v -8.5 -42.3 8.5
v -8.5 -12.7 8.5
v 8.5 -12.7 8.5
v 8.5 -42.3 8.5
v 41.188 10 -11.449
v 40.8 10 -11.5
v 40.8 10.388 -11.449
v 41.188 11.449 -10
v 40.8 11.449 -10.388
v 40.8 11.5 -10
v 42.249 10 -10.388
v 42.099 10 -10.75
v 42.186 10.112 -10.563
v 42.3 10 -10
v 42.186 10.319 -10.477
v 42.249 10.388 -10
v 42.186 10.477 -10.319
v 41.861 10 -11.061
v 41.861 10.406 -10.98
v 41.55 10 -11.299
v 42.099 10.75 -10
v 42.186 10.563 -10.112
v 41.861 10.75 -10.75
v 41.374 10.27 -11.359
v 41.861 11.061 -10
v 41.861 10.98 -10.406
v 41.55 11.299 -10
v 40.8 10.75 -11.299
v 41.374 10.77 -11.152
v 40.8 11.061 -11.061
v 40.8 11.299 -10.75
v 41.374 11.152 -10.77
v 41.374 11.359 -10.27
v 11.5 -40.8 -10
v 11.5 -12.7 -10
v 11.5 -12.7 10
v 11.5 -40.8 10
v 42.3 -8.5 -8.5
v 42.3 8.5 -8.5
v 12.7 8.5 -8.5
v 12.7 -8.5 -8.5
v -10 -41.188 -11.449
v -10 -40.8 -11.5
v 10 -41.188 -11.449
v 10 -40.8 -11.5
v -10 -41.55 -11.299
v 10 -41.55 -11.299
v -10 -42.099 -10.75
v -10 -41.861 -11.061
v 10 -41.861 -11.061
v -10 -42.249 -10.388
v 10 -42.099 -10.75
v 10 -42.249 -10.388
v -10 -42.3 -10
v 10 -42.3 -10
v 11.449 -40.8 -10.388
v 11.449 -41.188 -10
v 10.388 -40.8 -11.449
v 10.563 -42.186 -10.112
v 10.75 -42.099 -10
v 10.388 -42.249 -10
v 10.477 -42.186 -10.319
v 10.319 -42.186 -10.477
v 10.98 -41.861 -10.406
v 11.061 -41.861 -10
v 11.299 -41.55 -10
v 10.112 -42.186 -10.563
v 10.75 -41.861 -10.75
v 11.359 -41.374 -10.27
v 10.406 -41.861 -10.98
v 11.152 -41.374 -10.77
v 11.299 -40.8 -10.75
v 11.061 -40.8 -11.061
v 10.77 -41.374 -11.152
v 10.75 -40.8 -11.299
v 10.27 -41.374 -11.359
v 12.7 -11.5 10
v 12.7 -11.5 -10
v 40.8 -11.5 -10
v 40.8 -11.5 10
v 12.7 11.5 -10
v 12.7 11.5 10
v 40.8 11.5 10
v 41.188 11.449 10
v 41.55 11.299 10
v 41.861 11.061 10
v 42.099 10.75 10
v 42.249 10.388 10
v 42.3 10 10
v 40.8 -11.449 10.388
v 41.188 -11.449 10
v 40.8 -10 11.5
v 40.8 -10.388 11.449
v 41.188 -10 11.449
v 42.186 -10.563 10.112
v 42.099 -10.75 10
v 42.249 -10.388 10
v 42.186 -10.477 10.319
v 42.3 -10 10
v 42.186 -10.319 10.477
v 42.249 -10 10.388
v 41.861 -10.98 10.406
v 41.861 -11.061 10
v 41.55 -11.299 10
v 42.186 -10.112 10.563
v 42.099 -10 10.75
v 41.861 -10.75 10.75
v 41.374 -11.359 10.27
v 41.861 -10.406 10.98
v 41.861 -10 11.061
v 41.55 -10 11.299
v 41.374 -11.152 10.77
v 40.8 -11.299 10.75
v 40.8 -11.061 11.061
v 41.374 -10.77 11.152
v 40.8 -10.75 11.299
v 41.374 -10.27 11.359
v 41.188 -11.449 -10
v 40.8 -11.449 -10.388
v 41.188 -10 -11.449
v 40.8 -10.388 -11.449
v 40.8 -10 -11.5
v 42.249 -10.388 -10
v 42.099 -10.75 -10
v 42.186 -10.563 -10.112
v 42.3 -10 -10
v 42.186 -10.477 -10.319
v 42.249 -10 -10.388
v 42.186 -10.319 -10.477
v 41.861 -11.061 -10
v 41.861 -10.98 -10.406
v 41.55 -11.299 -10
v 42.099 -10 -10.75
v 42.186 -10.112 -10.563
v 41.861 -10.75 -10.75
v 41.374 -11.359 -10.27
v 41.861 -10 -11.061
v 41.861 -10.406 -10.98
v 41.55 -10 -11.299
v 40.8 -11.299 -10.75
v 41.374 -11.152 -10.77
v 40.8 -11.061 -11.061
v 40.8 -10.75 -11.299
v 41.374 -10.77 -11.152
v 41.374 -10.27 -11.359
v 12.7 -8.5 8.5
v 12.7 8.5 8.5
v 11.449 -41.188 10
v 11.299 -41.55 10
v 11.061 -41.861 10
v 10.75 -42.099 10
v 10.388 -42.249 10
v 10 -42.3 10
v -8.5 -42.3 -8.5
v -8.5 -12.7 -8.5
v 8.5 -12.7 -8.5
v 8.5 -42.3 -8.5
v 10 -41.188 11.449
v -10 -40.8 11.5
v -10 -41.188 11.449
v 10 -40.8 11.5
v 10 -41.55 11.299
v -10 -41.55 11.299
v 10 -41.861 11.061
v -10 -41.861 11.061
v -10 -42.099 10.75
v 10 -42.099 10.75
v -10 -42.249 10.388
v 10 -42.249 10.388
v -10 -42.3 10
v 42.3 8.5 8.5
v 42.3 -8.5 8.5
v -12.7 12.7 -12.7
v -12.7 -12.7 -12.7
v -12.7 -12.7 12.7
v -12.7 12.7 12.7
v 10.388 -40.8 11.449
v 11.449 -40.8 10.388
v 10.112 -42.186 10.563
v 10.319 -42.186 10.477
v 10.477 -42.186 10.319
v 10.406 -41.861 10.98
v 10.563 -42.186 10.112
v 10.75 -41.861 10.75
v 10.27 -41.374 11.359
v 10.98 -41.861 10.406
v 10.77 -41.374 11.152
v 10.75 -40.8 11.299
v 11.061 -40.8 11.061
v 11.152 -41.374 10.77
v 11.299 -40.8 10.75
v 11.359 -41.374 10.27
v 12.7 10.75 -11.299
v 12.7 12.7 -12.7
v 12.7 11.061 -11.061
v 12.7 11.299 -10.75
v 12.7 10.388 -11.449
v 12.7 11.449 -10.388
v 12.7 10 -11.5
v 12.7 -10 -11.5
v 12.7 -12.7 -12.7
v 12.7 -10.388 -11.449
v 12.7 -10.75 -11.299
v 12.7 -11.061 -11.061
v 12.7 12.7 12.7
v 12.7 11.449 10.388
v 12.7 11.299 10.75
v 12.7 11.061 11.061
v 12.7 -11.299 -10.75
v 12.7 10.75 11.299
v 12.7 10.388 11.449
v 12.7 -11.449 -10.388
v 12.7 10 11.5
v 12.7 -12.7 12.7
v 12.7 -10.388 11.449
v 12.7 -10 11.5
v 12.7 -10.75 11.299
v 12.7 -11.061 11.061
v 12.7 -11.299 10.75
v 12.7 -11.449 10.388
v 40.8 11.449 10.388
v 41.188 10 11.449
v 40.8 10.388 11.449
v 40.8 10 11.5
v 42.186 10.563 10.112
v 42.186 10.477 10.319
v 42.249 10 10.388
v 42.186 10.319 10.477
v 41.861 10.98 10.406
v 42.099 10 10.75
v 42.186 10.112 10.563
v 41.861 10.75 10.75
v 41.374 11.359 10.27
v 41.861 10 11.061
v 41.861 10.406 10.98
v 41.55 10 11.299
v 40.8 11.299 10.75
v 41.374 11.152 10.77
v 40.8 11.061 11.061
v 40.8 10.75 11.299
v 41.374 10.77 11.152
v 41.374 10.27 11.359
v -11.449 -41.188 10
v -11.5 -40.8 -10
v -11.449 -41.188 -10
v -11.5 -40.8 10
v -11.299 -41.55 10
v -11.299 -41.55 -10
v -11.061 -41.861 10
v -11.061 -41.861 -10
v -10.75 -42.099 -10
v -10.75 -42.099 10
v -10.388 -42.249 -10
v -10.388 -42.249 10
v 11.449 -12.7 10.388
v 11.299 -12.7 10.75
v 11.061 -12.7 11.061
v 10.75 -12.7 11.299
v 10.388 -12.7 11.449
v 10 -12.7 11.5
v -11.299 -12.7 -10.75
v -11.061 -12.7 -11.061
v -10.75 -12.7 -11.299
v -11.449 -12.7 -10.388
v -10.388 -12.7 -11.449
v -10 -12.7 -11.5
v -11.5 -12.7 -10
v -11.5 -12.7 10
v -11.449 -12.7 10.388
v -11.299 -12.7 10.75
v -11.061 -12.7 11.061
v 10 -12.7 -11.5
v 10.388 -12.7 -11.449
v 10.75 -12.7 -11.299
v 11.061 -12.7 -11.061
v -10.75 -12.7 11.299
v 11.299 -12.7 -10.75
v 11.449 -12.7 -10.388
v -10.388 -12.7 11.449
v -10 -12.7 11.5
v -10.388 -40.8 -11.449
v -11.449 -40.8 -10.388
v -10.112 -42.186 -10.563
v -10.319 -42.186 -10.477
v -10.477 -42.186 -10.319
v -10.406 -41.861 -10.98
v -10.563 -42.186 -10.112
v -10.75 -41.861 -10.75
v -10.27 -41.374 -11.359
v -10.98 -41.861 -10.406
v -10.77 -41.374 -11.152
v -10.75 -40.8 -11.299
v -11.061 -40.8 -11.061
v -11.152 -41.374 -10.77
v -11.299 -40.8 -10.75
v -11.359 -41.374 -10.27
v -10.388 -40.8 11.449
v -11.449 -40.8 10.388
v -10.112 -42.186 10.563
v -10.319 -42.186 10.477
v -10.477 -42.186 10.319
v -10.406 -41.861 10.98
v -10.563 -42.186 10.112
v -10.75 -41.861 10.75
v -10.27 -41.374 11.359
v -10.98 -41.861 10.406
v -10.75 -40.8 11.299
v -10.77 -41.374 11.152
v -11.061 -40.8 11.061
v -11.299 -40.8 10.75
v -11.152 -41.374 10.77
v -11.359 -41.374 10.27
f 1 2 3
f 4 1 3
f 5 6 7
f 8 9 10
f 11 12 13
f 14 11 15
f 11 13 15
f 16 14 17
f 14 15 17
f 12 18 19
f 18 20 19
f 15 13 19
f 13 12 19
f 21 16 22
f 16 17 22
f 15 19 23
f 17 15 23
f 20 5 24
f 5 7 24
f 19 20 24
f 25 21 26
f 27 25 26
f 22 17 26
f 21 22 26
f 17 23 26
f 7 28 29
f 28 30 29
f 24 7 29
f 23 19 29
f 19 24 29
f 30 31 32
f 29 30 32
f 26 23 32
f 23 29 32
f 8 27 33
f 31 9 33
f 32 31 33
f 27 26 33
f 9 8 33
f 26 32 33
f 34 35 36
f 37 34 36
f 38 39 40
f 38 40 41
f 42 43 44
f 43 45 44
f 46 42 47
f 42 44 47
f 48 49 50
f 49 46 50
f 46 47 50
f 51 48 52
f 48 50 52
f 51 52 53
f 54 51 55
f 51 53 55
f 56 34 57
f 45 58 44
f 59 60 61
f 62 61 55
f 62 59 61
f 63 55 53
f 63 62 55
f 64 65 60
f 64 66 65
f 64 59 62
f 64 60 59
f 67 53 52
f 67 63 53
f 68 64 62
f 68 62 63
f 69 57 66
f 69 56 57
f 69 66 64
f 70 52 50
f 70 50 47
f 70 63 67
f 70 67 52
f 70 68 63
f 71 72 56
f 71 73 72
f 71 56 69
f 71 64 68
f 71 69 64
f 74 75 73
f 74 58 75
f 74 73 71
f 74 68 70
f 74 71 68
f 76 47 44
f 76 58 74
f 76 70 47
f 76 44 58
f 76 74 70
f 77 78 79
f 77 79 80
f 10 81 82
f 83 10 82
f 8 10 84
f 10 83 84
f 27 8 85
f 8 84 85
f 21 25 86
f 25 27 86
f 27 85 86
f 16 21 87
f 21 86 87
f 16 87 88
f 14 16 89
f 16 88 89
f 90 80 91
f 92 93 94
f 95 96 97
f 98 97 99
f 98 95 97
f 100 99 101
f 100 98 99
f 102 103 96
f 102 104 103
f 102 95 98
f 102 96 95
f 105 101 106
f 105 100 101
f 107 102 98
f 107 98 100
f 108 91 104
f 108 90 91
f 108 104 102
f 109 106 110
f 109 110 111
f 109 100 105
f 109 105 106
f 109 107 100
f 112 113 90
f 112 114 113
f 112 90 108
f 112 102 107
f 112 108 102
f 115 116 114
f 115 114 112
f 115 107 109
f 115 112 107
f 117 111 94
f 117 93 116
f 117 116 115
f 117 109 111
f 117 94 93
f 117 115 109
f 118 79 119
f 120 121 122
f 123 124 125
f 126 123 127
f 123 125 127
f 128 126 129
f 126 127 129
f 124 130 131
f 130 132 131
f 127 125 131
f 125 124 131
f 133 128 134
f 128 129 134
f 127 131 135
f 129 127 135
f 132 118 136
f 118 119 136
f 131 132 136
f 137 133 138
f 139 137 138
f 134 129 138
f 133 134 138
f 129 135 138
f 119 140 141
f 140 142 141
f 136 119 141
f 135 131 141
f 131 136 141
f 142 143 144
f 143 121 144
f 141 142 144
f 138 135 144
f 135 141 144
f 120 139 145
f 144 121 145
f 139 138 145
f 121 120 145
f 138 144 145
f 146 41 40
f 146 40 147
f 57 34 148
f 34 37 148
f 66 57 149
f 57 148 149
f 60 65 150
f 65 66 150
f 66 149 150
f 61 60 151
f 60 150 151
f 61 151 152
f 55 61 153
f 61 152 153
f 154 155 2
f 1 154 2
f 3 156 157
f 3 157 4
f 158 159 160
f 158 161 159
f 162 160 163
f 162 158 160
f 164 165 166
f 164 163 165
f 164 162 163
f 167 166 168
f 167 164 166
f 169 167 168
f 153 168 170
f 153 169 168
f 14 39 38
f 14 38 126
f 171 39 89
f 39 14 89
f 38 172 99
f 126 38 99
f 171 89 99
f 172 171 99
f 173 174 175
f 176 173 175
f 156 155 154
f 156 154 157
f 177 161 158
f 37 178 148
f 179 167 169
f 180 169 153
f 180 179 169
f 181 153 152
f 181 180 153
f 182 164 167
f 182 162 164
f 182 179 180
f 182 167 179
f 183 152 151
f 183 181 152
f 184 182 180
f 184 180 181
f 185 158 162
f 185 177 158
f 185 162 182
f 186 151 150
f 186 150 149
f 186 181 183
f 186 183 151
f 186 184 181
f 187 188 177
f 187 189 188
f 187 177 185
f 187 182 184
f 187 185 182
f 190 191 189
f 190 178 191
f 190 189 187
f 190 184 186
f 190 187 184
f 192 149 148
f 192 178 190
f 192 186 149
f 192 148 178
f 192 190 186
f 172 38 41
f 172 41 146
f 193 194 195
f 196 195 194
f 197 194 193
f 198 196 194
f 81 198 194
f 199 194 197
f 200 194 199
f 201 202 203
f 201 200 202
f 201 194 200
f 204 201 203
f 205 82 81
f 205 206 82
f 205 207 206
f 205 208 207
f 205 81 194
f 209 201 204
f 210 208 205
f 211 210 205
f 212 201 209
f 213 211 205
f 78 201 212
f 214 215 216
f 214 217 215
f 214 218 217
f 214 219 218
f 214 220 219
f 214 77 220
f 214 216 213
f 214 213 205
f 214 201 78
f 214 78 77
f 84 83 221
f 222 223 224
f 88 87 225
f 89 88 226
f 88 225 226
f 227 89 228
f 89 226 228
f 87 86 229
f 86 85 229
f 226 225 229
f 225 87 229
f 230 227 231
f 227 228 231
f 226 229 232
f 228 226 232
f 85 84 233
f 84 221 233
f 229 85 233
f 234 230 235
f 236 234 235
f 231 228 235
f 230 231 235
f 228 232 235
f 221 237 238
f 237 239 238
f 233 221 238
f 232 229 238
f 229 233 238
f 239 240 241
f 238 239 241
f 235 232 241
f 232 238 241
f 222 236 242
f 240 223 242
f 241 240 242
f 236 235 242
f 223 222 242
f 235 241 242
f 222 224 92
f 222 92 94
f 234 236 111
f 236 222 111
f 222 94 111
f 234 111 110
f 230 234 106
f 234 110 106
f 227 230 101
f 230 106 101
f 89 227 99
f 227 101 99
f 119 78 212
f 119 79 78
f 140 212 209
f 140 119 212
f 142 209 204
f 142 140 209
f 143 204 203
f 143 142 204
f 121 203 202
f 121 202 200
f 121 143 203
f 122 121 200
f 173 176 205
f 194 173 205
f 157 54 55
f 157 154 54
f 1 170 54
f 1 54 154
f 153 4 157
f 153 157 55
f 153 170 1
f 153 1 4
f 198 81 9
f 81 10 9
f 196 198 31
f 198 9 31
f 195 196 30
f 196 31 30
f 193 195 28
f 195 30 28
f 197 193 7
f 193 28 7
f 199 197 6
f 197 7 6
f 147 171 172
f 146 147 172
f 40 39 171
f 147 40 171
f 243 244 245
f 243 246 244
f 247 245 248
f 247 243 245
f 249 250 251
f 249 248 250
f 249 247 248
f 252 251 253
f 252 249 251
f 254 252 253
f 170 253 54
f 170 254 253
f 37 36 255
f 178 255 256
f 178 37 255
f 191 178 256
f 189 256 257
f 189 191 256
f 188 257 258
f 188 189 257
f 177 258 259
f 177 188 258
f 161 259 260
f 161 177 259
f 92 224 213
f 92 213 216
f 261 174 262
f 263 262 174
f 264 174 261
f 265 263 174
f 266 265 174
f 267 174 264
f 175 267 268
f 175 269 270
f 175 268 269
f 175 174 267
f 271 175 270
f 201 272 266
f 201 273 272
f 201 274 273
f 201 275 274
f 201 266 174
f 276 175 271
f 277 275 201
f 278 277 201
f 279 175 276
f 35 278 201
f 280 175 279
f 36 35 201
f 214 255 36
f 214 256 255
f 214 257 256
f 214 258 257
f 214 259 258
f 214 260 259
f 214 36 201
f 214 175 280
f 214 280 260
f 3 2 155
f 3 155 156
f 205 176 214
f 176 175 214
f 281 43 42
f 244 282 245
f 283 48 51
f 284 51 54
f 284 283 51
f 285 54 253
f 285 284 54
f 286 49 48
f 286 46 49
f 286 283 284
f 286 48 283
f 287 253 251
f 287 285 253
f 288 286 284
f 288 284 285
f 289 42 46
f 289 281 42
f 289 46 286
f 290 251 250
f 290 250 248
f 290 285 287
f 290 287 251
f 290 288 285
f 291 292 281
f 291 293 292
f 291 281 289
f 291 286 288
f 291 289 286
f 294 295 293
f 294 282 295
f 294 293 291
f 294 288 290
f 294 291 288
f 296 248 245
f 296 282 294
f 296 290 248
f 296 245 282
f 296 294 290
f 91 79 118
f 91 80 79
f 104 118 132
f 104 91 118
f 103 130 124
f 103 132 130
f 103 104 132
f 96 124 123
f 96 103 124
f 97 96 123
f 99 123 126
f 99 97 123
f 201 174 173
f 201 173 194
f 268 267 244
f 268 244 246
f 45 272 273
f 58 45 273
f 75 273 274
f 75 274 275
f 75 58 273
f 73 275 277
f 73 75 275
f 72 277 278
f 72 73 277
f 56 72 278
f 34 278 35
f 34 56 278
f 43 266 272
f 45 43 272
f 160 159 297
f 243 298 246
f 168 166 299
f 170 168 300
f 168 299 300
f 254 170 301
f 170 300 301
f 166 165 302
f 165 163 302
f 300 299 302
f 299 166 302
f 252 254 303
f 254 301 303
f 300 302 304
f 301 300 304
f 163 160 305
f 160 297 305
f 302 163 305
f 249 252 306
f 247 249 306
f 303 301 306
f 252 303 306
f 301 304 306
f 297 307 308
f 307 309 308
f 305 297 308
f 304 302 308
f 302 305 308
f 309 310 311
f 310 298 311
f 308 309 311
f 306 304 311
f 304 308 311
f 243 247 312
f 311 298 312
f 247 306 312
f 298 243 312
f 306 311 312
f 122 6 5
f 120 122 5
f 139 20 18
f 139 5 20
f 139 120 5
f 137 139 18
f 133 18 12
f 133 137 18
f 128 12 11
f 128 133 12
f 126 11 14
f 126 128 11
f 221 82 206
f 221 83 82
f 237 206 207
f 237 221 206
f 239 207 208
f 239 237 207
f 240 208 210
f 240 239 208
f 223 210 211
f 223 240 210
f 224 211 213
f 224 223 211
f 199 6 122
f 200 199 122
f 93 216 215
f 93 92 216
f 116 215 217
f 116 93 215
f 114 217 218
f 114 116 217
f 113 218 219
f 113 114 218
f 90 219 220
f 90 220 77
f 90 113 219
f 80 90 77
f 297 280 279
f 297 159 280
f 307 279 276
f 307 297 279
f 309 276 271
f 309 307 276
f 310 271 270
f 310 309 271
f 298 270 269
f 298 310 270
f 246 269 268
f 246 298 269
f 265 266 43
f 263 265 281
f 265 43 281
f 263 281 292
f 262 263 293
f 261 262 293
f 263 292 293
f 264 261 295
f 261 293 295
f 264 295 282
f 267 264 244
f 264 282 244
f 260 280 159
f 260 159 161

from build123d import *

# Parameters (mm, degrees)
F0_W     = 25.4
F0_H     = 25.4
F1_DEPTH = 12.7
F2_W     = 23
F2_H     = 23
F2_W_2   = 17
F2_H_2   = 17
F3_DEPTH = 29.6
F4_R     = 1.5


# Not quite as in the source:
# - a pattern or mirror of a feature is missing from the dataset's text; its kind, count and spacing are read off the source's solid


with BuildPart() as f1:
    # F0 (on Front) → F1 (new body, symmetric)
    with BuildSketch(Plane.XZ):
        Rectangle(F0_W, F0_H)
    extrude(amount=F1_DEPTH, both=True)

    # F2 (on face) → F3 (join)
    with BuildSketch(Plane.XZ.offset(12.7)):
        Rectangle(F2_W, F2_H)
        Rectangle(F2_W_2, F2_H_2, mode=Mode.SUBTRACT)
    f3 = extrude(amount=F3_DEPTH)

    # F3_copies: F3 across plane
    add(f3.mirror(Plane(origin=(0, 0, 0), x_dir=(-0.7071067812, 0.7071067812, 0), z_dir=(0.7071067812, 0.7071067812, 0))))

    # F4
    f4_edges = [f1.edges().sort_by_distance(p)[0] for p in [
        (11.5, -27.5, 11.5),
        (11.5, -27.5, -11.5),
        (-11.5, -27.5, 11.5),
        (-11.5, -27.5, -11.5),
        (0, -42.3, 11.5),
        (11.5, -42.3, 0),
        (0, -42.3, -11.5),
        (-11.5, -42.3, 0),
        (27.5, -11.5, -11.5),
        (27.5, -11.5, 11.5),
        (42.3, -11.5, 0),
        (27.5, 11.5, -11.5),
        (42.3, 0, -11.5),
        (27.5, 11.5, 11.5),
        (42.3, 11.5, 0),
        (42.3, 0, 11.5),
    ]]
    fillet(f4_edges, radius=F4_R)


solid = f1.part
